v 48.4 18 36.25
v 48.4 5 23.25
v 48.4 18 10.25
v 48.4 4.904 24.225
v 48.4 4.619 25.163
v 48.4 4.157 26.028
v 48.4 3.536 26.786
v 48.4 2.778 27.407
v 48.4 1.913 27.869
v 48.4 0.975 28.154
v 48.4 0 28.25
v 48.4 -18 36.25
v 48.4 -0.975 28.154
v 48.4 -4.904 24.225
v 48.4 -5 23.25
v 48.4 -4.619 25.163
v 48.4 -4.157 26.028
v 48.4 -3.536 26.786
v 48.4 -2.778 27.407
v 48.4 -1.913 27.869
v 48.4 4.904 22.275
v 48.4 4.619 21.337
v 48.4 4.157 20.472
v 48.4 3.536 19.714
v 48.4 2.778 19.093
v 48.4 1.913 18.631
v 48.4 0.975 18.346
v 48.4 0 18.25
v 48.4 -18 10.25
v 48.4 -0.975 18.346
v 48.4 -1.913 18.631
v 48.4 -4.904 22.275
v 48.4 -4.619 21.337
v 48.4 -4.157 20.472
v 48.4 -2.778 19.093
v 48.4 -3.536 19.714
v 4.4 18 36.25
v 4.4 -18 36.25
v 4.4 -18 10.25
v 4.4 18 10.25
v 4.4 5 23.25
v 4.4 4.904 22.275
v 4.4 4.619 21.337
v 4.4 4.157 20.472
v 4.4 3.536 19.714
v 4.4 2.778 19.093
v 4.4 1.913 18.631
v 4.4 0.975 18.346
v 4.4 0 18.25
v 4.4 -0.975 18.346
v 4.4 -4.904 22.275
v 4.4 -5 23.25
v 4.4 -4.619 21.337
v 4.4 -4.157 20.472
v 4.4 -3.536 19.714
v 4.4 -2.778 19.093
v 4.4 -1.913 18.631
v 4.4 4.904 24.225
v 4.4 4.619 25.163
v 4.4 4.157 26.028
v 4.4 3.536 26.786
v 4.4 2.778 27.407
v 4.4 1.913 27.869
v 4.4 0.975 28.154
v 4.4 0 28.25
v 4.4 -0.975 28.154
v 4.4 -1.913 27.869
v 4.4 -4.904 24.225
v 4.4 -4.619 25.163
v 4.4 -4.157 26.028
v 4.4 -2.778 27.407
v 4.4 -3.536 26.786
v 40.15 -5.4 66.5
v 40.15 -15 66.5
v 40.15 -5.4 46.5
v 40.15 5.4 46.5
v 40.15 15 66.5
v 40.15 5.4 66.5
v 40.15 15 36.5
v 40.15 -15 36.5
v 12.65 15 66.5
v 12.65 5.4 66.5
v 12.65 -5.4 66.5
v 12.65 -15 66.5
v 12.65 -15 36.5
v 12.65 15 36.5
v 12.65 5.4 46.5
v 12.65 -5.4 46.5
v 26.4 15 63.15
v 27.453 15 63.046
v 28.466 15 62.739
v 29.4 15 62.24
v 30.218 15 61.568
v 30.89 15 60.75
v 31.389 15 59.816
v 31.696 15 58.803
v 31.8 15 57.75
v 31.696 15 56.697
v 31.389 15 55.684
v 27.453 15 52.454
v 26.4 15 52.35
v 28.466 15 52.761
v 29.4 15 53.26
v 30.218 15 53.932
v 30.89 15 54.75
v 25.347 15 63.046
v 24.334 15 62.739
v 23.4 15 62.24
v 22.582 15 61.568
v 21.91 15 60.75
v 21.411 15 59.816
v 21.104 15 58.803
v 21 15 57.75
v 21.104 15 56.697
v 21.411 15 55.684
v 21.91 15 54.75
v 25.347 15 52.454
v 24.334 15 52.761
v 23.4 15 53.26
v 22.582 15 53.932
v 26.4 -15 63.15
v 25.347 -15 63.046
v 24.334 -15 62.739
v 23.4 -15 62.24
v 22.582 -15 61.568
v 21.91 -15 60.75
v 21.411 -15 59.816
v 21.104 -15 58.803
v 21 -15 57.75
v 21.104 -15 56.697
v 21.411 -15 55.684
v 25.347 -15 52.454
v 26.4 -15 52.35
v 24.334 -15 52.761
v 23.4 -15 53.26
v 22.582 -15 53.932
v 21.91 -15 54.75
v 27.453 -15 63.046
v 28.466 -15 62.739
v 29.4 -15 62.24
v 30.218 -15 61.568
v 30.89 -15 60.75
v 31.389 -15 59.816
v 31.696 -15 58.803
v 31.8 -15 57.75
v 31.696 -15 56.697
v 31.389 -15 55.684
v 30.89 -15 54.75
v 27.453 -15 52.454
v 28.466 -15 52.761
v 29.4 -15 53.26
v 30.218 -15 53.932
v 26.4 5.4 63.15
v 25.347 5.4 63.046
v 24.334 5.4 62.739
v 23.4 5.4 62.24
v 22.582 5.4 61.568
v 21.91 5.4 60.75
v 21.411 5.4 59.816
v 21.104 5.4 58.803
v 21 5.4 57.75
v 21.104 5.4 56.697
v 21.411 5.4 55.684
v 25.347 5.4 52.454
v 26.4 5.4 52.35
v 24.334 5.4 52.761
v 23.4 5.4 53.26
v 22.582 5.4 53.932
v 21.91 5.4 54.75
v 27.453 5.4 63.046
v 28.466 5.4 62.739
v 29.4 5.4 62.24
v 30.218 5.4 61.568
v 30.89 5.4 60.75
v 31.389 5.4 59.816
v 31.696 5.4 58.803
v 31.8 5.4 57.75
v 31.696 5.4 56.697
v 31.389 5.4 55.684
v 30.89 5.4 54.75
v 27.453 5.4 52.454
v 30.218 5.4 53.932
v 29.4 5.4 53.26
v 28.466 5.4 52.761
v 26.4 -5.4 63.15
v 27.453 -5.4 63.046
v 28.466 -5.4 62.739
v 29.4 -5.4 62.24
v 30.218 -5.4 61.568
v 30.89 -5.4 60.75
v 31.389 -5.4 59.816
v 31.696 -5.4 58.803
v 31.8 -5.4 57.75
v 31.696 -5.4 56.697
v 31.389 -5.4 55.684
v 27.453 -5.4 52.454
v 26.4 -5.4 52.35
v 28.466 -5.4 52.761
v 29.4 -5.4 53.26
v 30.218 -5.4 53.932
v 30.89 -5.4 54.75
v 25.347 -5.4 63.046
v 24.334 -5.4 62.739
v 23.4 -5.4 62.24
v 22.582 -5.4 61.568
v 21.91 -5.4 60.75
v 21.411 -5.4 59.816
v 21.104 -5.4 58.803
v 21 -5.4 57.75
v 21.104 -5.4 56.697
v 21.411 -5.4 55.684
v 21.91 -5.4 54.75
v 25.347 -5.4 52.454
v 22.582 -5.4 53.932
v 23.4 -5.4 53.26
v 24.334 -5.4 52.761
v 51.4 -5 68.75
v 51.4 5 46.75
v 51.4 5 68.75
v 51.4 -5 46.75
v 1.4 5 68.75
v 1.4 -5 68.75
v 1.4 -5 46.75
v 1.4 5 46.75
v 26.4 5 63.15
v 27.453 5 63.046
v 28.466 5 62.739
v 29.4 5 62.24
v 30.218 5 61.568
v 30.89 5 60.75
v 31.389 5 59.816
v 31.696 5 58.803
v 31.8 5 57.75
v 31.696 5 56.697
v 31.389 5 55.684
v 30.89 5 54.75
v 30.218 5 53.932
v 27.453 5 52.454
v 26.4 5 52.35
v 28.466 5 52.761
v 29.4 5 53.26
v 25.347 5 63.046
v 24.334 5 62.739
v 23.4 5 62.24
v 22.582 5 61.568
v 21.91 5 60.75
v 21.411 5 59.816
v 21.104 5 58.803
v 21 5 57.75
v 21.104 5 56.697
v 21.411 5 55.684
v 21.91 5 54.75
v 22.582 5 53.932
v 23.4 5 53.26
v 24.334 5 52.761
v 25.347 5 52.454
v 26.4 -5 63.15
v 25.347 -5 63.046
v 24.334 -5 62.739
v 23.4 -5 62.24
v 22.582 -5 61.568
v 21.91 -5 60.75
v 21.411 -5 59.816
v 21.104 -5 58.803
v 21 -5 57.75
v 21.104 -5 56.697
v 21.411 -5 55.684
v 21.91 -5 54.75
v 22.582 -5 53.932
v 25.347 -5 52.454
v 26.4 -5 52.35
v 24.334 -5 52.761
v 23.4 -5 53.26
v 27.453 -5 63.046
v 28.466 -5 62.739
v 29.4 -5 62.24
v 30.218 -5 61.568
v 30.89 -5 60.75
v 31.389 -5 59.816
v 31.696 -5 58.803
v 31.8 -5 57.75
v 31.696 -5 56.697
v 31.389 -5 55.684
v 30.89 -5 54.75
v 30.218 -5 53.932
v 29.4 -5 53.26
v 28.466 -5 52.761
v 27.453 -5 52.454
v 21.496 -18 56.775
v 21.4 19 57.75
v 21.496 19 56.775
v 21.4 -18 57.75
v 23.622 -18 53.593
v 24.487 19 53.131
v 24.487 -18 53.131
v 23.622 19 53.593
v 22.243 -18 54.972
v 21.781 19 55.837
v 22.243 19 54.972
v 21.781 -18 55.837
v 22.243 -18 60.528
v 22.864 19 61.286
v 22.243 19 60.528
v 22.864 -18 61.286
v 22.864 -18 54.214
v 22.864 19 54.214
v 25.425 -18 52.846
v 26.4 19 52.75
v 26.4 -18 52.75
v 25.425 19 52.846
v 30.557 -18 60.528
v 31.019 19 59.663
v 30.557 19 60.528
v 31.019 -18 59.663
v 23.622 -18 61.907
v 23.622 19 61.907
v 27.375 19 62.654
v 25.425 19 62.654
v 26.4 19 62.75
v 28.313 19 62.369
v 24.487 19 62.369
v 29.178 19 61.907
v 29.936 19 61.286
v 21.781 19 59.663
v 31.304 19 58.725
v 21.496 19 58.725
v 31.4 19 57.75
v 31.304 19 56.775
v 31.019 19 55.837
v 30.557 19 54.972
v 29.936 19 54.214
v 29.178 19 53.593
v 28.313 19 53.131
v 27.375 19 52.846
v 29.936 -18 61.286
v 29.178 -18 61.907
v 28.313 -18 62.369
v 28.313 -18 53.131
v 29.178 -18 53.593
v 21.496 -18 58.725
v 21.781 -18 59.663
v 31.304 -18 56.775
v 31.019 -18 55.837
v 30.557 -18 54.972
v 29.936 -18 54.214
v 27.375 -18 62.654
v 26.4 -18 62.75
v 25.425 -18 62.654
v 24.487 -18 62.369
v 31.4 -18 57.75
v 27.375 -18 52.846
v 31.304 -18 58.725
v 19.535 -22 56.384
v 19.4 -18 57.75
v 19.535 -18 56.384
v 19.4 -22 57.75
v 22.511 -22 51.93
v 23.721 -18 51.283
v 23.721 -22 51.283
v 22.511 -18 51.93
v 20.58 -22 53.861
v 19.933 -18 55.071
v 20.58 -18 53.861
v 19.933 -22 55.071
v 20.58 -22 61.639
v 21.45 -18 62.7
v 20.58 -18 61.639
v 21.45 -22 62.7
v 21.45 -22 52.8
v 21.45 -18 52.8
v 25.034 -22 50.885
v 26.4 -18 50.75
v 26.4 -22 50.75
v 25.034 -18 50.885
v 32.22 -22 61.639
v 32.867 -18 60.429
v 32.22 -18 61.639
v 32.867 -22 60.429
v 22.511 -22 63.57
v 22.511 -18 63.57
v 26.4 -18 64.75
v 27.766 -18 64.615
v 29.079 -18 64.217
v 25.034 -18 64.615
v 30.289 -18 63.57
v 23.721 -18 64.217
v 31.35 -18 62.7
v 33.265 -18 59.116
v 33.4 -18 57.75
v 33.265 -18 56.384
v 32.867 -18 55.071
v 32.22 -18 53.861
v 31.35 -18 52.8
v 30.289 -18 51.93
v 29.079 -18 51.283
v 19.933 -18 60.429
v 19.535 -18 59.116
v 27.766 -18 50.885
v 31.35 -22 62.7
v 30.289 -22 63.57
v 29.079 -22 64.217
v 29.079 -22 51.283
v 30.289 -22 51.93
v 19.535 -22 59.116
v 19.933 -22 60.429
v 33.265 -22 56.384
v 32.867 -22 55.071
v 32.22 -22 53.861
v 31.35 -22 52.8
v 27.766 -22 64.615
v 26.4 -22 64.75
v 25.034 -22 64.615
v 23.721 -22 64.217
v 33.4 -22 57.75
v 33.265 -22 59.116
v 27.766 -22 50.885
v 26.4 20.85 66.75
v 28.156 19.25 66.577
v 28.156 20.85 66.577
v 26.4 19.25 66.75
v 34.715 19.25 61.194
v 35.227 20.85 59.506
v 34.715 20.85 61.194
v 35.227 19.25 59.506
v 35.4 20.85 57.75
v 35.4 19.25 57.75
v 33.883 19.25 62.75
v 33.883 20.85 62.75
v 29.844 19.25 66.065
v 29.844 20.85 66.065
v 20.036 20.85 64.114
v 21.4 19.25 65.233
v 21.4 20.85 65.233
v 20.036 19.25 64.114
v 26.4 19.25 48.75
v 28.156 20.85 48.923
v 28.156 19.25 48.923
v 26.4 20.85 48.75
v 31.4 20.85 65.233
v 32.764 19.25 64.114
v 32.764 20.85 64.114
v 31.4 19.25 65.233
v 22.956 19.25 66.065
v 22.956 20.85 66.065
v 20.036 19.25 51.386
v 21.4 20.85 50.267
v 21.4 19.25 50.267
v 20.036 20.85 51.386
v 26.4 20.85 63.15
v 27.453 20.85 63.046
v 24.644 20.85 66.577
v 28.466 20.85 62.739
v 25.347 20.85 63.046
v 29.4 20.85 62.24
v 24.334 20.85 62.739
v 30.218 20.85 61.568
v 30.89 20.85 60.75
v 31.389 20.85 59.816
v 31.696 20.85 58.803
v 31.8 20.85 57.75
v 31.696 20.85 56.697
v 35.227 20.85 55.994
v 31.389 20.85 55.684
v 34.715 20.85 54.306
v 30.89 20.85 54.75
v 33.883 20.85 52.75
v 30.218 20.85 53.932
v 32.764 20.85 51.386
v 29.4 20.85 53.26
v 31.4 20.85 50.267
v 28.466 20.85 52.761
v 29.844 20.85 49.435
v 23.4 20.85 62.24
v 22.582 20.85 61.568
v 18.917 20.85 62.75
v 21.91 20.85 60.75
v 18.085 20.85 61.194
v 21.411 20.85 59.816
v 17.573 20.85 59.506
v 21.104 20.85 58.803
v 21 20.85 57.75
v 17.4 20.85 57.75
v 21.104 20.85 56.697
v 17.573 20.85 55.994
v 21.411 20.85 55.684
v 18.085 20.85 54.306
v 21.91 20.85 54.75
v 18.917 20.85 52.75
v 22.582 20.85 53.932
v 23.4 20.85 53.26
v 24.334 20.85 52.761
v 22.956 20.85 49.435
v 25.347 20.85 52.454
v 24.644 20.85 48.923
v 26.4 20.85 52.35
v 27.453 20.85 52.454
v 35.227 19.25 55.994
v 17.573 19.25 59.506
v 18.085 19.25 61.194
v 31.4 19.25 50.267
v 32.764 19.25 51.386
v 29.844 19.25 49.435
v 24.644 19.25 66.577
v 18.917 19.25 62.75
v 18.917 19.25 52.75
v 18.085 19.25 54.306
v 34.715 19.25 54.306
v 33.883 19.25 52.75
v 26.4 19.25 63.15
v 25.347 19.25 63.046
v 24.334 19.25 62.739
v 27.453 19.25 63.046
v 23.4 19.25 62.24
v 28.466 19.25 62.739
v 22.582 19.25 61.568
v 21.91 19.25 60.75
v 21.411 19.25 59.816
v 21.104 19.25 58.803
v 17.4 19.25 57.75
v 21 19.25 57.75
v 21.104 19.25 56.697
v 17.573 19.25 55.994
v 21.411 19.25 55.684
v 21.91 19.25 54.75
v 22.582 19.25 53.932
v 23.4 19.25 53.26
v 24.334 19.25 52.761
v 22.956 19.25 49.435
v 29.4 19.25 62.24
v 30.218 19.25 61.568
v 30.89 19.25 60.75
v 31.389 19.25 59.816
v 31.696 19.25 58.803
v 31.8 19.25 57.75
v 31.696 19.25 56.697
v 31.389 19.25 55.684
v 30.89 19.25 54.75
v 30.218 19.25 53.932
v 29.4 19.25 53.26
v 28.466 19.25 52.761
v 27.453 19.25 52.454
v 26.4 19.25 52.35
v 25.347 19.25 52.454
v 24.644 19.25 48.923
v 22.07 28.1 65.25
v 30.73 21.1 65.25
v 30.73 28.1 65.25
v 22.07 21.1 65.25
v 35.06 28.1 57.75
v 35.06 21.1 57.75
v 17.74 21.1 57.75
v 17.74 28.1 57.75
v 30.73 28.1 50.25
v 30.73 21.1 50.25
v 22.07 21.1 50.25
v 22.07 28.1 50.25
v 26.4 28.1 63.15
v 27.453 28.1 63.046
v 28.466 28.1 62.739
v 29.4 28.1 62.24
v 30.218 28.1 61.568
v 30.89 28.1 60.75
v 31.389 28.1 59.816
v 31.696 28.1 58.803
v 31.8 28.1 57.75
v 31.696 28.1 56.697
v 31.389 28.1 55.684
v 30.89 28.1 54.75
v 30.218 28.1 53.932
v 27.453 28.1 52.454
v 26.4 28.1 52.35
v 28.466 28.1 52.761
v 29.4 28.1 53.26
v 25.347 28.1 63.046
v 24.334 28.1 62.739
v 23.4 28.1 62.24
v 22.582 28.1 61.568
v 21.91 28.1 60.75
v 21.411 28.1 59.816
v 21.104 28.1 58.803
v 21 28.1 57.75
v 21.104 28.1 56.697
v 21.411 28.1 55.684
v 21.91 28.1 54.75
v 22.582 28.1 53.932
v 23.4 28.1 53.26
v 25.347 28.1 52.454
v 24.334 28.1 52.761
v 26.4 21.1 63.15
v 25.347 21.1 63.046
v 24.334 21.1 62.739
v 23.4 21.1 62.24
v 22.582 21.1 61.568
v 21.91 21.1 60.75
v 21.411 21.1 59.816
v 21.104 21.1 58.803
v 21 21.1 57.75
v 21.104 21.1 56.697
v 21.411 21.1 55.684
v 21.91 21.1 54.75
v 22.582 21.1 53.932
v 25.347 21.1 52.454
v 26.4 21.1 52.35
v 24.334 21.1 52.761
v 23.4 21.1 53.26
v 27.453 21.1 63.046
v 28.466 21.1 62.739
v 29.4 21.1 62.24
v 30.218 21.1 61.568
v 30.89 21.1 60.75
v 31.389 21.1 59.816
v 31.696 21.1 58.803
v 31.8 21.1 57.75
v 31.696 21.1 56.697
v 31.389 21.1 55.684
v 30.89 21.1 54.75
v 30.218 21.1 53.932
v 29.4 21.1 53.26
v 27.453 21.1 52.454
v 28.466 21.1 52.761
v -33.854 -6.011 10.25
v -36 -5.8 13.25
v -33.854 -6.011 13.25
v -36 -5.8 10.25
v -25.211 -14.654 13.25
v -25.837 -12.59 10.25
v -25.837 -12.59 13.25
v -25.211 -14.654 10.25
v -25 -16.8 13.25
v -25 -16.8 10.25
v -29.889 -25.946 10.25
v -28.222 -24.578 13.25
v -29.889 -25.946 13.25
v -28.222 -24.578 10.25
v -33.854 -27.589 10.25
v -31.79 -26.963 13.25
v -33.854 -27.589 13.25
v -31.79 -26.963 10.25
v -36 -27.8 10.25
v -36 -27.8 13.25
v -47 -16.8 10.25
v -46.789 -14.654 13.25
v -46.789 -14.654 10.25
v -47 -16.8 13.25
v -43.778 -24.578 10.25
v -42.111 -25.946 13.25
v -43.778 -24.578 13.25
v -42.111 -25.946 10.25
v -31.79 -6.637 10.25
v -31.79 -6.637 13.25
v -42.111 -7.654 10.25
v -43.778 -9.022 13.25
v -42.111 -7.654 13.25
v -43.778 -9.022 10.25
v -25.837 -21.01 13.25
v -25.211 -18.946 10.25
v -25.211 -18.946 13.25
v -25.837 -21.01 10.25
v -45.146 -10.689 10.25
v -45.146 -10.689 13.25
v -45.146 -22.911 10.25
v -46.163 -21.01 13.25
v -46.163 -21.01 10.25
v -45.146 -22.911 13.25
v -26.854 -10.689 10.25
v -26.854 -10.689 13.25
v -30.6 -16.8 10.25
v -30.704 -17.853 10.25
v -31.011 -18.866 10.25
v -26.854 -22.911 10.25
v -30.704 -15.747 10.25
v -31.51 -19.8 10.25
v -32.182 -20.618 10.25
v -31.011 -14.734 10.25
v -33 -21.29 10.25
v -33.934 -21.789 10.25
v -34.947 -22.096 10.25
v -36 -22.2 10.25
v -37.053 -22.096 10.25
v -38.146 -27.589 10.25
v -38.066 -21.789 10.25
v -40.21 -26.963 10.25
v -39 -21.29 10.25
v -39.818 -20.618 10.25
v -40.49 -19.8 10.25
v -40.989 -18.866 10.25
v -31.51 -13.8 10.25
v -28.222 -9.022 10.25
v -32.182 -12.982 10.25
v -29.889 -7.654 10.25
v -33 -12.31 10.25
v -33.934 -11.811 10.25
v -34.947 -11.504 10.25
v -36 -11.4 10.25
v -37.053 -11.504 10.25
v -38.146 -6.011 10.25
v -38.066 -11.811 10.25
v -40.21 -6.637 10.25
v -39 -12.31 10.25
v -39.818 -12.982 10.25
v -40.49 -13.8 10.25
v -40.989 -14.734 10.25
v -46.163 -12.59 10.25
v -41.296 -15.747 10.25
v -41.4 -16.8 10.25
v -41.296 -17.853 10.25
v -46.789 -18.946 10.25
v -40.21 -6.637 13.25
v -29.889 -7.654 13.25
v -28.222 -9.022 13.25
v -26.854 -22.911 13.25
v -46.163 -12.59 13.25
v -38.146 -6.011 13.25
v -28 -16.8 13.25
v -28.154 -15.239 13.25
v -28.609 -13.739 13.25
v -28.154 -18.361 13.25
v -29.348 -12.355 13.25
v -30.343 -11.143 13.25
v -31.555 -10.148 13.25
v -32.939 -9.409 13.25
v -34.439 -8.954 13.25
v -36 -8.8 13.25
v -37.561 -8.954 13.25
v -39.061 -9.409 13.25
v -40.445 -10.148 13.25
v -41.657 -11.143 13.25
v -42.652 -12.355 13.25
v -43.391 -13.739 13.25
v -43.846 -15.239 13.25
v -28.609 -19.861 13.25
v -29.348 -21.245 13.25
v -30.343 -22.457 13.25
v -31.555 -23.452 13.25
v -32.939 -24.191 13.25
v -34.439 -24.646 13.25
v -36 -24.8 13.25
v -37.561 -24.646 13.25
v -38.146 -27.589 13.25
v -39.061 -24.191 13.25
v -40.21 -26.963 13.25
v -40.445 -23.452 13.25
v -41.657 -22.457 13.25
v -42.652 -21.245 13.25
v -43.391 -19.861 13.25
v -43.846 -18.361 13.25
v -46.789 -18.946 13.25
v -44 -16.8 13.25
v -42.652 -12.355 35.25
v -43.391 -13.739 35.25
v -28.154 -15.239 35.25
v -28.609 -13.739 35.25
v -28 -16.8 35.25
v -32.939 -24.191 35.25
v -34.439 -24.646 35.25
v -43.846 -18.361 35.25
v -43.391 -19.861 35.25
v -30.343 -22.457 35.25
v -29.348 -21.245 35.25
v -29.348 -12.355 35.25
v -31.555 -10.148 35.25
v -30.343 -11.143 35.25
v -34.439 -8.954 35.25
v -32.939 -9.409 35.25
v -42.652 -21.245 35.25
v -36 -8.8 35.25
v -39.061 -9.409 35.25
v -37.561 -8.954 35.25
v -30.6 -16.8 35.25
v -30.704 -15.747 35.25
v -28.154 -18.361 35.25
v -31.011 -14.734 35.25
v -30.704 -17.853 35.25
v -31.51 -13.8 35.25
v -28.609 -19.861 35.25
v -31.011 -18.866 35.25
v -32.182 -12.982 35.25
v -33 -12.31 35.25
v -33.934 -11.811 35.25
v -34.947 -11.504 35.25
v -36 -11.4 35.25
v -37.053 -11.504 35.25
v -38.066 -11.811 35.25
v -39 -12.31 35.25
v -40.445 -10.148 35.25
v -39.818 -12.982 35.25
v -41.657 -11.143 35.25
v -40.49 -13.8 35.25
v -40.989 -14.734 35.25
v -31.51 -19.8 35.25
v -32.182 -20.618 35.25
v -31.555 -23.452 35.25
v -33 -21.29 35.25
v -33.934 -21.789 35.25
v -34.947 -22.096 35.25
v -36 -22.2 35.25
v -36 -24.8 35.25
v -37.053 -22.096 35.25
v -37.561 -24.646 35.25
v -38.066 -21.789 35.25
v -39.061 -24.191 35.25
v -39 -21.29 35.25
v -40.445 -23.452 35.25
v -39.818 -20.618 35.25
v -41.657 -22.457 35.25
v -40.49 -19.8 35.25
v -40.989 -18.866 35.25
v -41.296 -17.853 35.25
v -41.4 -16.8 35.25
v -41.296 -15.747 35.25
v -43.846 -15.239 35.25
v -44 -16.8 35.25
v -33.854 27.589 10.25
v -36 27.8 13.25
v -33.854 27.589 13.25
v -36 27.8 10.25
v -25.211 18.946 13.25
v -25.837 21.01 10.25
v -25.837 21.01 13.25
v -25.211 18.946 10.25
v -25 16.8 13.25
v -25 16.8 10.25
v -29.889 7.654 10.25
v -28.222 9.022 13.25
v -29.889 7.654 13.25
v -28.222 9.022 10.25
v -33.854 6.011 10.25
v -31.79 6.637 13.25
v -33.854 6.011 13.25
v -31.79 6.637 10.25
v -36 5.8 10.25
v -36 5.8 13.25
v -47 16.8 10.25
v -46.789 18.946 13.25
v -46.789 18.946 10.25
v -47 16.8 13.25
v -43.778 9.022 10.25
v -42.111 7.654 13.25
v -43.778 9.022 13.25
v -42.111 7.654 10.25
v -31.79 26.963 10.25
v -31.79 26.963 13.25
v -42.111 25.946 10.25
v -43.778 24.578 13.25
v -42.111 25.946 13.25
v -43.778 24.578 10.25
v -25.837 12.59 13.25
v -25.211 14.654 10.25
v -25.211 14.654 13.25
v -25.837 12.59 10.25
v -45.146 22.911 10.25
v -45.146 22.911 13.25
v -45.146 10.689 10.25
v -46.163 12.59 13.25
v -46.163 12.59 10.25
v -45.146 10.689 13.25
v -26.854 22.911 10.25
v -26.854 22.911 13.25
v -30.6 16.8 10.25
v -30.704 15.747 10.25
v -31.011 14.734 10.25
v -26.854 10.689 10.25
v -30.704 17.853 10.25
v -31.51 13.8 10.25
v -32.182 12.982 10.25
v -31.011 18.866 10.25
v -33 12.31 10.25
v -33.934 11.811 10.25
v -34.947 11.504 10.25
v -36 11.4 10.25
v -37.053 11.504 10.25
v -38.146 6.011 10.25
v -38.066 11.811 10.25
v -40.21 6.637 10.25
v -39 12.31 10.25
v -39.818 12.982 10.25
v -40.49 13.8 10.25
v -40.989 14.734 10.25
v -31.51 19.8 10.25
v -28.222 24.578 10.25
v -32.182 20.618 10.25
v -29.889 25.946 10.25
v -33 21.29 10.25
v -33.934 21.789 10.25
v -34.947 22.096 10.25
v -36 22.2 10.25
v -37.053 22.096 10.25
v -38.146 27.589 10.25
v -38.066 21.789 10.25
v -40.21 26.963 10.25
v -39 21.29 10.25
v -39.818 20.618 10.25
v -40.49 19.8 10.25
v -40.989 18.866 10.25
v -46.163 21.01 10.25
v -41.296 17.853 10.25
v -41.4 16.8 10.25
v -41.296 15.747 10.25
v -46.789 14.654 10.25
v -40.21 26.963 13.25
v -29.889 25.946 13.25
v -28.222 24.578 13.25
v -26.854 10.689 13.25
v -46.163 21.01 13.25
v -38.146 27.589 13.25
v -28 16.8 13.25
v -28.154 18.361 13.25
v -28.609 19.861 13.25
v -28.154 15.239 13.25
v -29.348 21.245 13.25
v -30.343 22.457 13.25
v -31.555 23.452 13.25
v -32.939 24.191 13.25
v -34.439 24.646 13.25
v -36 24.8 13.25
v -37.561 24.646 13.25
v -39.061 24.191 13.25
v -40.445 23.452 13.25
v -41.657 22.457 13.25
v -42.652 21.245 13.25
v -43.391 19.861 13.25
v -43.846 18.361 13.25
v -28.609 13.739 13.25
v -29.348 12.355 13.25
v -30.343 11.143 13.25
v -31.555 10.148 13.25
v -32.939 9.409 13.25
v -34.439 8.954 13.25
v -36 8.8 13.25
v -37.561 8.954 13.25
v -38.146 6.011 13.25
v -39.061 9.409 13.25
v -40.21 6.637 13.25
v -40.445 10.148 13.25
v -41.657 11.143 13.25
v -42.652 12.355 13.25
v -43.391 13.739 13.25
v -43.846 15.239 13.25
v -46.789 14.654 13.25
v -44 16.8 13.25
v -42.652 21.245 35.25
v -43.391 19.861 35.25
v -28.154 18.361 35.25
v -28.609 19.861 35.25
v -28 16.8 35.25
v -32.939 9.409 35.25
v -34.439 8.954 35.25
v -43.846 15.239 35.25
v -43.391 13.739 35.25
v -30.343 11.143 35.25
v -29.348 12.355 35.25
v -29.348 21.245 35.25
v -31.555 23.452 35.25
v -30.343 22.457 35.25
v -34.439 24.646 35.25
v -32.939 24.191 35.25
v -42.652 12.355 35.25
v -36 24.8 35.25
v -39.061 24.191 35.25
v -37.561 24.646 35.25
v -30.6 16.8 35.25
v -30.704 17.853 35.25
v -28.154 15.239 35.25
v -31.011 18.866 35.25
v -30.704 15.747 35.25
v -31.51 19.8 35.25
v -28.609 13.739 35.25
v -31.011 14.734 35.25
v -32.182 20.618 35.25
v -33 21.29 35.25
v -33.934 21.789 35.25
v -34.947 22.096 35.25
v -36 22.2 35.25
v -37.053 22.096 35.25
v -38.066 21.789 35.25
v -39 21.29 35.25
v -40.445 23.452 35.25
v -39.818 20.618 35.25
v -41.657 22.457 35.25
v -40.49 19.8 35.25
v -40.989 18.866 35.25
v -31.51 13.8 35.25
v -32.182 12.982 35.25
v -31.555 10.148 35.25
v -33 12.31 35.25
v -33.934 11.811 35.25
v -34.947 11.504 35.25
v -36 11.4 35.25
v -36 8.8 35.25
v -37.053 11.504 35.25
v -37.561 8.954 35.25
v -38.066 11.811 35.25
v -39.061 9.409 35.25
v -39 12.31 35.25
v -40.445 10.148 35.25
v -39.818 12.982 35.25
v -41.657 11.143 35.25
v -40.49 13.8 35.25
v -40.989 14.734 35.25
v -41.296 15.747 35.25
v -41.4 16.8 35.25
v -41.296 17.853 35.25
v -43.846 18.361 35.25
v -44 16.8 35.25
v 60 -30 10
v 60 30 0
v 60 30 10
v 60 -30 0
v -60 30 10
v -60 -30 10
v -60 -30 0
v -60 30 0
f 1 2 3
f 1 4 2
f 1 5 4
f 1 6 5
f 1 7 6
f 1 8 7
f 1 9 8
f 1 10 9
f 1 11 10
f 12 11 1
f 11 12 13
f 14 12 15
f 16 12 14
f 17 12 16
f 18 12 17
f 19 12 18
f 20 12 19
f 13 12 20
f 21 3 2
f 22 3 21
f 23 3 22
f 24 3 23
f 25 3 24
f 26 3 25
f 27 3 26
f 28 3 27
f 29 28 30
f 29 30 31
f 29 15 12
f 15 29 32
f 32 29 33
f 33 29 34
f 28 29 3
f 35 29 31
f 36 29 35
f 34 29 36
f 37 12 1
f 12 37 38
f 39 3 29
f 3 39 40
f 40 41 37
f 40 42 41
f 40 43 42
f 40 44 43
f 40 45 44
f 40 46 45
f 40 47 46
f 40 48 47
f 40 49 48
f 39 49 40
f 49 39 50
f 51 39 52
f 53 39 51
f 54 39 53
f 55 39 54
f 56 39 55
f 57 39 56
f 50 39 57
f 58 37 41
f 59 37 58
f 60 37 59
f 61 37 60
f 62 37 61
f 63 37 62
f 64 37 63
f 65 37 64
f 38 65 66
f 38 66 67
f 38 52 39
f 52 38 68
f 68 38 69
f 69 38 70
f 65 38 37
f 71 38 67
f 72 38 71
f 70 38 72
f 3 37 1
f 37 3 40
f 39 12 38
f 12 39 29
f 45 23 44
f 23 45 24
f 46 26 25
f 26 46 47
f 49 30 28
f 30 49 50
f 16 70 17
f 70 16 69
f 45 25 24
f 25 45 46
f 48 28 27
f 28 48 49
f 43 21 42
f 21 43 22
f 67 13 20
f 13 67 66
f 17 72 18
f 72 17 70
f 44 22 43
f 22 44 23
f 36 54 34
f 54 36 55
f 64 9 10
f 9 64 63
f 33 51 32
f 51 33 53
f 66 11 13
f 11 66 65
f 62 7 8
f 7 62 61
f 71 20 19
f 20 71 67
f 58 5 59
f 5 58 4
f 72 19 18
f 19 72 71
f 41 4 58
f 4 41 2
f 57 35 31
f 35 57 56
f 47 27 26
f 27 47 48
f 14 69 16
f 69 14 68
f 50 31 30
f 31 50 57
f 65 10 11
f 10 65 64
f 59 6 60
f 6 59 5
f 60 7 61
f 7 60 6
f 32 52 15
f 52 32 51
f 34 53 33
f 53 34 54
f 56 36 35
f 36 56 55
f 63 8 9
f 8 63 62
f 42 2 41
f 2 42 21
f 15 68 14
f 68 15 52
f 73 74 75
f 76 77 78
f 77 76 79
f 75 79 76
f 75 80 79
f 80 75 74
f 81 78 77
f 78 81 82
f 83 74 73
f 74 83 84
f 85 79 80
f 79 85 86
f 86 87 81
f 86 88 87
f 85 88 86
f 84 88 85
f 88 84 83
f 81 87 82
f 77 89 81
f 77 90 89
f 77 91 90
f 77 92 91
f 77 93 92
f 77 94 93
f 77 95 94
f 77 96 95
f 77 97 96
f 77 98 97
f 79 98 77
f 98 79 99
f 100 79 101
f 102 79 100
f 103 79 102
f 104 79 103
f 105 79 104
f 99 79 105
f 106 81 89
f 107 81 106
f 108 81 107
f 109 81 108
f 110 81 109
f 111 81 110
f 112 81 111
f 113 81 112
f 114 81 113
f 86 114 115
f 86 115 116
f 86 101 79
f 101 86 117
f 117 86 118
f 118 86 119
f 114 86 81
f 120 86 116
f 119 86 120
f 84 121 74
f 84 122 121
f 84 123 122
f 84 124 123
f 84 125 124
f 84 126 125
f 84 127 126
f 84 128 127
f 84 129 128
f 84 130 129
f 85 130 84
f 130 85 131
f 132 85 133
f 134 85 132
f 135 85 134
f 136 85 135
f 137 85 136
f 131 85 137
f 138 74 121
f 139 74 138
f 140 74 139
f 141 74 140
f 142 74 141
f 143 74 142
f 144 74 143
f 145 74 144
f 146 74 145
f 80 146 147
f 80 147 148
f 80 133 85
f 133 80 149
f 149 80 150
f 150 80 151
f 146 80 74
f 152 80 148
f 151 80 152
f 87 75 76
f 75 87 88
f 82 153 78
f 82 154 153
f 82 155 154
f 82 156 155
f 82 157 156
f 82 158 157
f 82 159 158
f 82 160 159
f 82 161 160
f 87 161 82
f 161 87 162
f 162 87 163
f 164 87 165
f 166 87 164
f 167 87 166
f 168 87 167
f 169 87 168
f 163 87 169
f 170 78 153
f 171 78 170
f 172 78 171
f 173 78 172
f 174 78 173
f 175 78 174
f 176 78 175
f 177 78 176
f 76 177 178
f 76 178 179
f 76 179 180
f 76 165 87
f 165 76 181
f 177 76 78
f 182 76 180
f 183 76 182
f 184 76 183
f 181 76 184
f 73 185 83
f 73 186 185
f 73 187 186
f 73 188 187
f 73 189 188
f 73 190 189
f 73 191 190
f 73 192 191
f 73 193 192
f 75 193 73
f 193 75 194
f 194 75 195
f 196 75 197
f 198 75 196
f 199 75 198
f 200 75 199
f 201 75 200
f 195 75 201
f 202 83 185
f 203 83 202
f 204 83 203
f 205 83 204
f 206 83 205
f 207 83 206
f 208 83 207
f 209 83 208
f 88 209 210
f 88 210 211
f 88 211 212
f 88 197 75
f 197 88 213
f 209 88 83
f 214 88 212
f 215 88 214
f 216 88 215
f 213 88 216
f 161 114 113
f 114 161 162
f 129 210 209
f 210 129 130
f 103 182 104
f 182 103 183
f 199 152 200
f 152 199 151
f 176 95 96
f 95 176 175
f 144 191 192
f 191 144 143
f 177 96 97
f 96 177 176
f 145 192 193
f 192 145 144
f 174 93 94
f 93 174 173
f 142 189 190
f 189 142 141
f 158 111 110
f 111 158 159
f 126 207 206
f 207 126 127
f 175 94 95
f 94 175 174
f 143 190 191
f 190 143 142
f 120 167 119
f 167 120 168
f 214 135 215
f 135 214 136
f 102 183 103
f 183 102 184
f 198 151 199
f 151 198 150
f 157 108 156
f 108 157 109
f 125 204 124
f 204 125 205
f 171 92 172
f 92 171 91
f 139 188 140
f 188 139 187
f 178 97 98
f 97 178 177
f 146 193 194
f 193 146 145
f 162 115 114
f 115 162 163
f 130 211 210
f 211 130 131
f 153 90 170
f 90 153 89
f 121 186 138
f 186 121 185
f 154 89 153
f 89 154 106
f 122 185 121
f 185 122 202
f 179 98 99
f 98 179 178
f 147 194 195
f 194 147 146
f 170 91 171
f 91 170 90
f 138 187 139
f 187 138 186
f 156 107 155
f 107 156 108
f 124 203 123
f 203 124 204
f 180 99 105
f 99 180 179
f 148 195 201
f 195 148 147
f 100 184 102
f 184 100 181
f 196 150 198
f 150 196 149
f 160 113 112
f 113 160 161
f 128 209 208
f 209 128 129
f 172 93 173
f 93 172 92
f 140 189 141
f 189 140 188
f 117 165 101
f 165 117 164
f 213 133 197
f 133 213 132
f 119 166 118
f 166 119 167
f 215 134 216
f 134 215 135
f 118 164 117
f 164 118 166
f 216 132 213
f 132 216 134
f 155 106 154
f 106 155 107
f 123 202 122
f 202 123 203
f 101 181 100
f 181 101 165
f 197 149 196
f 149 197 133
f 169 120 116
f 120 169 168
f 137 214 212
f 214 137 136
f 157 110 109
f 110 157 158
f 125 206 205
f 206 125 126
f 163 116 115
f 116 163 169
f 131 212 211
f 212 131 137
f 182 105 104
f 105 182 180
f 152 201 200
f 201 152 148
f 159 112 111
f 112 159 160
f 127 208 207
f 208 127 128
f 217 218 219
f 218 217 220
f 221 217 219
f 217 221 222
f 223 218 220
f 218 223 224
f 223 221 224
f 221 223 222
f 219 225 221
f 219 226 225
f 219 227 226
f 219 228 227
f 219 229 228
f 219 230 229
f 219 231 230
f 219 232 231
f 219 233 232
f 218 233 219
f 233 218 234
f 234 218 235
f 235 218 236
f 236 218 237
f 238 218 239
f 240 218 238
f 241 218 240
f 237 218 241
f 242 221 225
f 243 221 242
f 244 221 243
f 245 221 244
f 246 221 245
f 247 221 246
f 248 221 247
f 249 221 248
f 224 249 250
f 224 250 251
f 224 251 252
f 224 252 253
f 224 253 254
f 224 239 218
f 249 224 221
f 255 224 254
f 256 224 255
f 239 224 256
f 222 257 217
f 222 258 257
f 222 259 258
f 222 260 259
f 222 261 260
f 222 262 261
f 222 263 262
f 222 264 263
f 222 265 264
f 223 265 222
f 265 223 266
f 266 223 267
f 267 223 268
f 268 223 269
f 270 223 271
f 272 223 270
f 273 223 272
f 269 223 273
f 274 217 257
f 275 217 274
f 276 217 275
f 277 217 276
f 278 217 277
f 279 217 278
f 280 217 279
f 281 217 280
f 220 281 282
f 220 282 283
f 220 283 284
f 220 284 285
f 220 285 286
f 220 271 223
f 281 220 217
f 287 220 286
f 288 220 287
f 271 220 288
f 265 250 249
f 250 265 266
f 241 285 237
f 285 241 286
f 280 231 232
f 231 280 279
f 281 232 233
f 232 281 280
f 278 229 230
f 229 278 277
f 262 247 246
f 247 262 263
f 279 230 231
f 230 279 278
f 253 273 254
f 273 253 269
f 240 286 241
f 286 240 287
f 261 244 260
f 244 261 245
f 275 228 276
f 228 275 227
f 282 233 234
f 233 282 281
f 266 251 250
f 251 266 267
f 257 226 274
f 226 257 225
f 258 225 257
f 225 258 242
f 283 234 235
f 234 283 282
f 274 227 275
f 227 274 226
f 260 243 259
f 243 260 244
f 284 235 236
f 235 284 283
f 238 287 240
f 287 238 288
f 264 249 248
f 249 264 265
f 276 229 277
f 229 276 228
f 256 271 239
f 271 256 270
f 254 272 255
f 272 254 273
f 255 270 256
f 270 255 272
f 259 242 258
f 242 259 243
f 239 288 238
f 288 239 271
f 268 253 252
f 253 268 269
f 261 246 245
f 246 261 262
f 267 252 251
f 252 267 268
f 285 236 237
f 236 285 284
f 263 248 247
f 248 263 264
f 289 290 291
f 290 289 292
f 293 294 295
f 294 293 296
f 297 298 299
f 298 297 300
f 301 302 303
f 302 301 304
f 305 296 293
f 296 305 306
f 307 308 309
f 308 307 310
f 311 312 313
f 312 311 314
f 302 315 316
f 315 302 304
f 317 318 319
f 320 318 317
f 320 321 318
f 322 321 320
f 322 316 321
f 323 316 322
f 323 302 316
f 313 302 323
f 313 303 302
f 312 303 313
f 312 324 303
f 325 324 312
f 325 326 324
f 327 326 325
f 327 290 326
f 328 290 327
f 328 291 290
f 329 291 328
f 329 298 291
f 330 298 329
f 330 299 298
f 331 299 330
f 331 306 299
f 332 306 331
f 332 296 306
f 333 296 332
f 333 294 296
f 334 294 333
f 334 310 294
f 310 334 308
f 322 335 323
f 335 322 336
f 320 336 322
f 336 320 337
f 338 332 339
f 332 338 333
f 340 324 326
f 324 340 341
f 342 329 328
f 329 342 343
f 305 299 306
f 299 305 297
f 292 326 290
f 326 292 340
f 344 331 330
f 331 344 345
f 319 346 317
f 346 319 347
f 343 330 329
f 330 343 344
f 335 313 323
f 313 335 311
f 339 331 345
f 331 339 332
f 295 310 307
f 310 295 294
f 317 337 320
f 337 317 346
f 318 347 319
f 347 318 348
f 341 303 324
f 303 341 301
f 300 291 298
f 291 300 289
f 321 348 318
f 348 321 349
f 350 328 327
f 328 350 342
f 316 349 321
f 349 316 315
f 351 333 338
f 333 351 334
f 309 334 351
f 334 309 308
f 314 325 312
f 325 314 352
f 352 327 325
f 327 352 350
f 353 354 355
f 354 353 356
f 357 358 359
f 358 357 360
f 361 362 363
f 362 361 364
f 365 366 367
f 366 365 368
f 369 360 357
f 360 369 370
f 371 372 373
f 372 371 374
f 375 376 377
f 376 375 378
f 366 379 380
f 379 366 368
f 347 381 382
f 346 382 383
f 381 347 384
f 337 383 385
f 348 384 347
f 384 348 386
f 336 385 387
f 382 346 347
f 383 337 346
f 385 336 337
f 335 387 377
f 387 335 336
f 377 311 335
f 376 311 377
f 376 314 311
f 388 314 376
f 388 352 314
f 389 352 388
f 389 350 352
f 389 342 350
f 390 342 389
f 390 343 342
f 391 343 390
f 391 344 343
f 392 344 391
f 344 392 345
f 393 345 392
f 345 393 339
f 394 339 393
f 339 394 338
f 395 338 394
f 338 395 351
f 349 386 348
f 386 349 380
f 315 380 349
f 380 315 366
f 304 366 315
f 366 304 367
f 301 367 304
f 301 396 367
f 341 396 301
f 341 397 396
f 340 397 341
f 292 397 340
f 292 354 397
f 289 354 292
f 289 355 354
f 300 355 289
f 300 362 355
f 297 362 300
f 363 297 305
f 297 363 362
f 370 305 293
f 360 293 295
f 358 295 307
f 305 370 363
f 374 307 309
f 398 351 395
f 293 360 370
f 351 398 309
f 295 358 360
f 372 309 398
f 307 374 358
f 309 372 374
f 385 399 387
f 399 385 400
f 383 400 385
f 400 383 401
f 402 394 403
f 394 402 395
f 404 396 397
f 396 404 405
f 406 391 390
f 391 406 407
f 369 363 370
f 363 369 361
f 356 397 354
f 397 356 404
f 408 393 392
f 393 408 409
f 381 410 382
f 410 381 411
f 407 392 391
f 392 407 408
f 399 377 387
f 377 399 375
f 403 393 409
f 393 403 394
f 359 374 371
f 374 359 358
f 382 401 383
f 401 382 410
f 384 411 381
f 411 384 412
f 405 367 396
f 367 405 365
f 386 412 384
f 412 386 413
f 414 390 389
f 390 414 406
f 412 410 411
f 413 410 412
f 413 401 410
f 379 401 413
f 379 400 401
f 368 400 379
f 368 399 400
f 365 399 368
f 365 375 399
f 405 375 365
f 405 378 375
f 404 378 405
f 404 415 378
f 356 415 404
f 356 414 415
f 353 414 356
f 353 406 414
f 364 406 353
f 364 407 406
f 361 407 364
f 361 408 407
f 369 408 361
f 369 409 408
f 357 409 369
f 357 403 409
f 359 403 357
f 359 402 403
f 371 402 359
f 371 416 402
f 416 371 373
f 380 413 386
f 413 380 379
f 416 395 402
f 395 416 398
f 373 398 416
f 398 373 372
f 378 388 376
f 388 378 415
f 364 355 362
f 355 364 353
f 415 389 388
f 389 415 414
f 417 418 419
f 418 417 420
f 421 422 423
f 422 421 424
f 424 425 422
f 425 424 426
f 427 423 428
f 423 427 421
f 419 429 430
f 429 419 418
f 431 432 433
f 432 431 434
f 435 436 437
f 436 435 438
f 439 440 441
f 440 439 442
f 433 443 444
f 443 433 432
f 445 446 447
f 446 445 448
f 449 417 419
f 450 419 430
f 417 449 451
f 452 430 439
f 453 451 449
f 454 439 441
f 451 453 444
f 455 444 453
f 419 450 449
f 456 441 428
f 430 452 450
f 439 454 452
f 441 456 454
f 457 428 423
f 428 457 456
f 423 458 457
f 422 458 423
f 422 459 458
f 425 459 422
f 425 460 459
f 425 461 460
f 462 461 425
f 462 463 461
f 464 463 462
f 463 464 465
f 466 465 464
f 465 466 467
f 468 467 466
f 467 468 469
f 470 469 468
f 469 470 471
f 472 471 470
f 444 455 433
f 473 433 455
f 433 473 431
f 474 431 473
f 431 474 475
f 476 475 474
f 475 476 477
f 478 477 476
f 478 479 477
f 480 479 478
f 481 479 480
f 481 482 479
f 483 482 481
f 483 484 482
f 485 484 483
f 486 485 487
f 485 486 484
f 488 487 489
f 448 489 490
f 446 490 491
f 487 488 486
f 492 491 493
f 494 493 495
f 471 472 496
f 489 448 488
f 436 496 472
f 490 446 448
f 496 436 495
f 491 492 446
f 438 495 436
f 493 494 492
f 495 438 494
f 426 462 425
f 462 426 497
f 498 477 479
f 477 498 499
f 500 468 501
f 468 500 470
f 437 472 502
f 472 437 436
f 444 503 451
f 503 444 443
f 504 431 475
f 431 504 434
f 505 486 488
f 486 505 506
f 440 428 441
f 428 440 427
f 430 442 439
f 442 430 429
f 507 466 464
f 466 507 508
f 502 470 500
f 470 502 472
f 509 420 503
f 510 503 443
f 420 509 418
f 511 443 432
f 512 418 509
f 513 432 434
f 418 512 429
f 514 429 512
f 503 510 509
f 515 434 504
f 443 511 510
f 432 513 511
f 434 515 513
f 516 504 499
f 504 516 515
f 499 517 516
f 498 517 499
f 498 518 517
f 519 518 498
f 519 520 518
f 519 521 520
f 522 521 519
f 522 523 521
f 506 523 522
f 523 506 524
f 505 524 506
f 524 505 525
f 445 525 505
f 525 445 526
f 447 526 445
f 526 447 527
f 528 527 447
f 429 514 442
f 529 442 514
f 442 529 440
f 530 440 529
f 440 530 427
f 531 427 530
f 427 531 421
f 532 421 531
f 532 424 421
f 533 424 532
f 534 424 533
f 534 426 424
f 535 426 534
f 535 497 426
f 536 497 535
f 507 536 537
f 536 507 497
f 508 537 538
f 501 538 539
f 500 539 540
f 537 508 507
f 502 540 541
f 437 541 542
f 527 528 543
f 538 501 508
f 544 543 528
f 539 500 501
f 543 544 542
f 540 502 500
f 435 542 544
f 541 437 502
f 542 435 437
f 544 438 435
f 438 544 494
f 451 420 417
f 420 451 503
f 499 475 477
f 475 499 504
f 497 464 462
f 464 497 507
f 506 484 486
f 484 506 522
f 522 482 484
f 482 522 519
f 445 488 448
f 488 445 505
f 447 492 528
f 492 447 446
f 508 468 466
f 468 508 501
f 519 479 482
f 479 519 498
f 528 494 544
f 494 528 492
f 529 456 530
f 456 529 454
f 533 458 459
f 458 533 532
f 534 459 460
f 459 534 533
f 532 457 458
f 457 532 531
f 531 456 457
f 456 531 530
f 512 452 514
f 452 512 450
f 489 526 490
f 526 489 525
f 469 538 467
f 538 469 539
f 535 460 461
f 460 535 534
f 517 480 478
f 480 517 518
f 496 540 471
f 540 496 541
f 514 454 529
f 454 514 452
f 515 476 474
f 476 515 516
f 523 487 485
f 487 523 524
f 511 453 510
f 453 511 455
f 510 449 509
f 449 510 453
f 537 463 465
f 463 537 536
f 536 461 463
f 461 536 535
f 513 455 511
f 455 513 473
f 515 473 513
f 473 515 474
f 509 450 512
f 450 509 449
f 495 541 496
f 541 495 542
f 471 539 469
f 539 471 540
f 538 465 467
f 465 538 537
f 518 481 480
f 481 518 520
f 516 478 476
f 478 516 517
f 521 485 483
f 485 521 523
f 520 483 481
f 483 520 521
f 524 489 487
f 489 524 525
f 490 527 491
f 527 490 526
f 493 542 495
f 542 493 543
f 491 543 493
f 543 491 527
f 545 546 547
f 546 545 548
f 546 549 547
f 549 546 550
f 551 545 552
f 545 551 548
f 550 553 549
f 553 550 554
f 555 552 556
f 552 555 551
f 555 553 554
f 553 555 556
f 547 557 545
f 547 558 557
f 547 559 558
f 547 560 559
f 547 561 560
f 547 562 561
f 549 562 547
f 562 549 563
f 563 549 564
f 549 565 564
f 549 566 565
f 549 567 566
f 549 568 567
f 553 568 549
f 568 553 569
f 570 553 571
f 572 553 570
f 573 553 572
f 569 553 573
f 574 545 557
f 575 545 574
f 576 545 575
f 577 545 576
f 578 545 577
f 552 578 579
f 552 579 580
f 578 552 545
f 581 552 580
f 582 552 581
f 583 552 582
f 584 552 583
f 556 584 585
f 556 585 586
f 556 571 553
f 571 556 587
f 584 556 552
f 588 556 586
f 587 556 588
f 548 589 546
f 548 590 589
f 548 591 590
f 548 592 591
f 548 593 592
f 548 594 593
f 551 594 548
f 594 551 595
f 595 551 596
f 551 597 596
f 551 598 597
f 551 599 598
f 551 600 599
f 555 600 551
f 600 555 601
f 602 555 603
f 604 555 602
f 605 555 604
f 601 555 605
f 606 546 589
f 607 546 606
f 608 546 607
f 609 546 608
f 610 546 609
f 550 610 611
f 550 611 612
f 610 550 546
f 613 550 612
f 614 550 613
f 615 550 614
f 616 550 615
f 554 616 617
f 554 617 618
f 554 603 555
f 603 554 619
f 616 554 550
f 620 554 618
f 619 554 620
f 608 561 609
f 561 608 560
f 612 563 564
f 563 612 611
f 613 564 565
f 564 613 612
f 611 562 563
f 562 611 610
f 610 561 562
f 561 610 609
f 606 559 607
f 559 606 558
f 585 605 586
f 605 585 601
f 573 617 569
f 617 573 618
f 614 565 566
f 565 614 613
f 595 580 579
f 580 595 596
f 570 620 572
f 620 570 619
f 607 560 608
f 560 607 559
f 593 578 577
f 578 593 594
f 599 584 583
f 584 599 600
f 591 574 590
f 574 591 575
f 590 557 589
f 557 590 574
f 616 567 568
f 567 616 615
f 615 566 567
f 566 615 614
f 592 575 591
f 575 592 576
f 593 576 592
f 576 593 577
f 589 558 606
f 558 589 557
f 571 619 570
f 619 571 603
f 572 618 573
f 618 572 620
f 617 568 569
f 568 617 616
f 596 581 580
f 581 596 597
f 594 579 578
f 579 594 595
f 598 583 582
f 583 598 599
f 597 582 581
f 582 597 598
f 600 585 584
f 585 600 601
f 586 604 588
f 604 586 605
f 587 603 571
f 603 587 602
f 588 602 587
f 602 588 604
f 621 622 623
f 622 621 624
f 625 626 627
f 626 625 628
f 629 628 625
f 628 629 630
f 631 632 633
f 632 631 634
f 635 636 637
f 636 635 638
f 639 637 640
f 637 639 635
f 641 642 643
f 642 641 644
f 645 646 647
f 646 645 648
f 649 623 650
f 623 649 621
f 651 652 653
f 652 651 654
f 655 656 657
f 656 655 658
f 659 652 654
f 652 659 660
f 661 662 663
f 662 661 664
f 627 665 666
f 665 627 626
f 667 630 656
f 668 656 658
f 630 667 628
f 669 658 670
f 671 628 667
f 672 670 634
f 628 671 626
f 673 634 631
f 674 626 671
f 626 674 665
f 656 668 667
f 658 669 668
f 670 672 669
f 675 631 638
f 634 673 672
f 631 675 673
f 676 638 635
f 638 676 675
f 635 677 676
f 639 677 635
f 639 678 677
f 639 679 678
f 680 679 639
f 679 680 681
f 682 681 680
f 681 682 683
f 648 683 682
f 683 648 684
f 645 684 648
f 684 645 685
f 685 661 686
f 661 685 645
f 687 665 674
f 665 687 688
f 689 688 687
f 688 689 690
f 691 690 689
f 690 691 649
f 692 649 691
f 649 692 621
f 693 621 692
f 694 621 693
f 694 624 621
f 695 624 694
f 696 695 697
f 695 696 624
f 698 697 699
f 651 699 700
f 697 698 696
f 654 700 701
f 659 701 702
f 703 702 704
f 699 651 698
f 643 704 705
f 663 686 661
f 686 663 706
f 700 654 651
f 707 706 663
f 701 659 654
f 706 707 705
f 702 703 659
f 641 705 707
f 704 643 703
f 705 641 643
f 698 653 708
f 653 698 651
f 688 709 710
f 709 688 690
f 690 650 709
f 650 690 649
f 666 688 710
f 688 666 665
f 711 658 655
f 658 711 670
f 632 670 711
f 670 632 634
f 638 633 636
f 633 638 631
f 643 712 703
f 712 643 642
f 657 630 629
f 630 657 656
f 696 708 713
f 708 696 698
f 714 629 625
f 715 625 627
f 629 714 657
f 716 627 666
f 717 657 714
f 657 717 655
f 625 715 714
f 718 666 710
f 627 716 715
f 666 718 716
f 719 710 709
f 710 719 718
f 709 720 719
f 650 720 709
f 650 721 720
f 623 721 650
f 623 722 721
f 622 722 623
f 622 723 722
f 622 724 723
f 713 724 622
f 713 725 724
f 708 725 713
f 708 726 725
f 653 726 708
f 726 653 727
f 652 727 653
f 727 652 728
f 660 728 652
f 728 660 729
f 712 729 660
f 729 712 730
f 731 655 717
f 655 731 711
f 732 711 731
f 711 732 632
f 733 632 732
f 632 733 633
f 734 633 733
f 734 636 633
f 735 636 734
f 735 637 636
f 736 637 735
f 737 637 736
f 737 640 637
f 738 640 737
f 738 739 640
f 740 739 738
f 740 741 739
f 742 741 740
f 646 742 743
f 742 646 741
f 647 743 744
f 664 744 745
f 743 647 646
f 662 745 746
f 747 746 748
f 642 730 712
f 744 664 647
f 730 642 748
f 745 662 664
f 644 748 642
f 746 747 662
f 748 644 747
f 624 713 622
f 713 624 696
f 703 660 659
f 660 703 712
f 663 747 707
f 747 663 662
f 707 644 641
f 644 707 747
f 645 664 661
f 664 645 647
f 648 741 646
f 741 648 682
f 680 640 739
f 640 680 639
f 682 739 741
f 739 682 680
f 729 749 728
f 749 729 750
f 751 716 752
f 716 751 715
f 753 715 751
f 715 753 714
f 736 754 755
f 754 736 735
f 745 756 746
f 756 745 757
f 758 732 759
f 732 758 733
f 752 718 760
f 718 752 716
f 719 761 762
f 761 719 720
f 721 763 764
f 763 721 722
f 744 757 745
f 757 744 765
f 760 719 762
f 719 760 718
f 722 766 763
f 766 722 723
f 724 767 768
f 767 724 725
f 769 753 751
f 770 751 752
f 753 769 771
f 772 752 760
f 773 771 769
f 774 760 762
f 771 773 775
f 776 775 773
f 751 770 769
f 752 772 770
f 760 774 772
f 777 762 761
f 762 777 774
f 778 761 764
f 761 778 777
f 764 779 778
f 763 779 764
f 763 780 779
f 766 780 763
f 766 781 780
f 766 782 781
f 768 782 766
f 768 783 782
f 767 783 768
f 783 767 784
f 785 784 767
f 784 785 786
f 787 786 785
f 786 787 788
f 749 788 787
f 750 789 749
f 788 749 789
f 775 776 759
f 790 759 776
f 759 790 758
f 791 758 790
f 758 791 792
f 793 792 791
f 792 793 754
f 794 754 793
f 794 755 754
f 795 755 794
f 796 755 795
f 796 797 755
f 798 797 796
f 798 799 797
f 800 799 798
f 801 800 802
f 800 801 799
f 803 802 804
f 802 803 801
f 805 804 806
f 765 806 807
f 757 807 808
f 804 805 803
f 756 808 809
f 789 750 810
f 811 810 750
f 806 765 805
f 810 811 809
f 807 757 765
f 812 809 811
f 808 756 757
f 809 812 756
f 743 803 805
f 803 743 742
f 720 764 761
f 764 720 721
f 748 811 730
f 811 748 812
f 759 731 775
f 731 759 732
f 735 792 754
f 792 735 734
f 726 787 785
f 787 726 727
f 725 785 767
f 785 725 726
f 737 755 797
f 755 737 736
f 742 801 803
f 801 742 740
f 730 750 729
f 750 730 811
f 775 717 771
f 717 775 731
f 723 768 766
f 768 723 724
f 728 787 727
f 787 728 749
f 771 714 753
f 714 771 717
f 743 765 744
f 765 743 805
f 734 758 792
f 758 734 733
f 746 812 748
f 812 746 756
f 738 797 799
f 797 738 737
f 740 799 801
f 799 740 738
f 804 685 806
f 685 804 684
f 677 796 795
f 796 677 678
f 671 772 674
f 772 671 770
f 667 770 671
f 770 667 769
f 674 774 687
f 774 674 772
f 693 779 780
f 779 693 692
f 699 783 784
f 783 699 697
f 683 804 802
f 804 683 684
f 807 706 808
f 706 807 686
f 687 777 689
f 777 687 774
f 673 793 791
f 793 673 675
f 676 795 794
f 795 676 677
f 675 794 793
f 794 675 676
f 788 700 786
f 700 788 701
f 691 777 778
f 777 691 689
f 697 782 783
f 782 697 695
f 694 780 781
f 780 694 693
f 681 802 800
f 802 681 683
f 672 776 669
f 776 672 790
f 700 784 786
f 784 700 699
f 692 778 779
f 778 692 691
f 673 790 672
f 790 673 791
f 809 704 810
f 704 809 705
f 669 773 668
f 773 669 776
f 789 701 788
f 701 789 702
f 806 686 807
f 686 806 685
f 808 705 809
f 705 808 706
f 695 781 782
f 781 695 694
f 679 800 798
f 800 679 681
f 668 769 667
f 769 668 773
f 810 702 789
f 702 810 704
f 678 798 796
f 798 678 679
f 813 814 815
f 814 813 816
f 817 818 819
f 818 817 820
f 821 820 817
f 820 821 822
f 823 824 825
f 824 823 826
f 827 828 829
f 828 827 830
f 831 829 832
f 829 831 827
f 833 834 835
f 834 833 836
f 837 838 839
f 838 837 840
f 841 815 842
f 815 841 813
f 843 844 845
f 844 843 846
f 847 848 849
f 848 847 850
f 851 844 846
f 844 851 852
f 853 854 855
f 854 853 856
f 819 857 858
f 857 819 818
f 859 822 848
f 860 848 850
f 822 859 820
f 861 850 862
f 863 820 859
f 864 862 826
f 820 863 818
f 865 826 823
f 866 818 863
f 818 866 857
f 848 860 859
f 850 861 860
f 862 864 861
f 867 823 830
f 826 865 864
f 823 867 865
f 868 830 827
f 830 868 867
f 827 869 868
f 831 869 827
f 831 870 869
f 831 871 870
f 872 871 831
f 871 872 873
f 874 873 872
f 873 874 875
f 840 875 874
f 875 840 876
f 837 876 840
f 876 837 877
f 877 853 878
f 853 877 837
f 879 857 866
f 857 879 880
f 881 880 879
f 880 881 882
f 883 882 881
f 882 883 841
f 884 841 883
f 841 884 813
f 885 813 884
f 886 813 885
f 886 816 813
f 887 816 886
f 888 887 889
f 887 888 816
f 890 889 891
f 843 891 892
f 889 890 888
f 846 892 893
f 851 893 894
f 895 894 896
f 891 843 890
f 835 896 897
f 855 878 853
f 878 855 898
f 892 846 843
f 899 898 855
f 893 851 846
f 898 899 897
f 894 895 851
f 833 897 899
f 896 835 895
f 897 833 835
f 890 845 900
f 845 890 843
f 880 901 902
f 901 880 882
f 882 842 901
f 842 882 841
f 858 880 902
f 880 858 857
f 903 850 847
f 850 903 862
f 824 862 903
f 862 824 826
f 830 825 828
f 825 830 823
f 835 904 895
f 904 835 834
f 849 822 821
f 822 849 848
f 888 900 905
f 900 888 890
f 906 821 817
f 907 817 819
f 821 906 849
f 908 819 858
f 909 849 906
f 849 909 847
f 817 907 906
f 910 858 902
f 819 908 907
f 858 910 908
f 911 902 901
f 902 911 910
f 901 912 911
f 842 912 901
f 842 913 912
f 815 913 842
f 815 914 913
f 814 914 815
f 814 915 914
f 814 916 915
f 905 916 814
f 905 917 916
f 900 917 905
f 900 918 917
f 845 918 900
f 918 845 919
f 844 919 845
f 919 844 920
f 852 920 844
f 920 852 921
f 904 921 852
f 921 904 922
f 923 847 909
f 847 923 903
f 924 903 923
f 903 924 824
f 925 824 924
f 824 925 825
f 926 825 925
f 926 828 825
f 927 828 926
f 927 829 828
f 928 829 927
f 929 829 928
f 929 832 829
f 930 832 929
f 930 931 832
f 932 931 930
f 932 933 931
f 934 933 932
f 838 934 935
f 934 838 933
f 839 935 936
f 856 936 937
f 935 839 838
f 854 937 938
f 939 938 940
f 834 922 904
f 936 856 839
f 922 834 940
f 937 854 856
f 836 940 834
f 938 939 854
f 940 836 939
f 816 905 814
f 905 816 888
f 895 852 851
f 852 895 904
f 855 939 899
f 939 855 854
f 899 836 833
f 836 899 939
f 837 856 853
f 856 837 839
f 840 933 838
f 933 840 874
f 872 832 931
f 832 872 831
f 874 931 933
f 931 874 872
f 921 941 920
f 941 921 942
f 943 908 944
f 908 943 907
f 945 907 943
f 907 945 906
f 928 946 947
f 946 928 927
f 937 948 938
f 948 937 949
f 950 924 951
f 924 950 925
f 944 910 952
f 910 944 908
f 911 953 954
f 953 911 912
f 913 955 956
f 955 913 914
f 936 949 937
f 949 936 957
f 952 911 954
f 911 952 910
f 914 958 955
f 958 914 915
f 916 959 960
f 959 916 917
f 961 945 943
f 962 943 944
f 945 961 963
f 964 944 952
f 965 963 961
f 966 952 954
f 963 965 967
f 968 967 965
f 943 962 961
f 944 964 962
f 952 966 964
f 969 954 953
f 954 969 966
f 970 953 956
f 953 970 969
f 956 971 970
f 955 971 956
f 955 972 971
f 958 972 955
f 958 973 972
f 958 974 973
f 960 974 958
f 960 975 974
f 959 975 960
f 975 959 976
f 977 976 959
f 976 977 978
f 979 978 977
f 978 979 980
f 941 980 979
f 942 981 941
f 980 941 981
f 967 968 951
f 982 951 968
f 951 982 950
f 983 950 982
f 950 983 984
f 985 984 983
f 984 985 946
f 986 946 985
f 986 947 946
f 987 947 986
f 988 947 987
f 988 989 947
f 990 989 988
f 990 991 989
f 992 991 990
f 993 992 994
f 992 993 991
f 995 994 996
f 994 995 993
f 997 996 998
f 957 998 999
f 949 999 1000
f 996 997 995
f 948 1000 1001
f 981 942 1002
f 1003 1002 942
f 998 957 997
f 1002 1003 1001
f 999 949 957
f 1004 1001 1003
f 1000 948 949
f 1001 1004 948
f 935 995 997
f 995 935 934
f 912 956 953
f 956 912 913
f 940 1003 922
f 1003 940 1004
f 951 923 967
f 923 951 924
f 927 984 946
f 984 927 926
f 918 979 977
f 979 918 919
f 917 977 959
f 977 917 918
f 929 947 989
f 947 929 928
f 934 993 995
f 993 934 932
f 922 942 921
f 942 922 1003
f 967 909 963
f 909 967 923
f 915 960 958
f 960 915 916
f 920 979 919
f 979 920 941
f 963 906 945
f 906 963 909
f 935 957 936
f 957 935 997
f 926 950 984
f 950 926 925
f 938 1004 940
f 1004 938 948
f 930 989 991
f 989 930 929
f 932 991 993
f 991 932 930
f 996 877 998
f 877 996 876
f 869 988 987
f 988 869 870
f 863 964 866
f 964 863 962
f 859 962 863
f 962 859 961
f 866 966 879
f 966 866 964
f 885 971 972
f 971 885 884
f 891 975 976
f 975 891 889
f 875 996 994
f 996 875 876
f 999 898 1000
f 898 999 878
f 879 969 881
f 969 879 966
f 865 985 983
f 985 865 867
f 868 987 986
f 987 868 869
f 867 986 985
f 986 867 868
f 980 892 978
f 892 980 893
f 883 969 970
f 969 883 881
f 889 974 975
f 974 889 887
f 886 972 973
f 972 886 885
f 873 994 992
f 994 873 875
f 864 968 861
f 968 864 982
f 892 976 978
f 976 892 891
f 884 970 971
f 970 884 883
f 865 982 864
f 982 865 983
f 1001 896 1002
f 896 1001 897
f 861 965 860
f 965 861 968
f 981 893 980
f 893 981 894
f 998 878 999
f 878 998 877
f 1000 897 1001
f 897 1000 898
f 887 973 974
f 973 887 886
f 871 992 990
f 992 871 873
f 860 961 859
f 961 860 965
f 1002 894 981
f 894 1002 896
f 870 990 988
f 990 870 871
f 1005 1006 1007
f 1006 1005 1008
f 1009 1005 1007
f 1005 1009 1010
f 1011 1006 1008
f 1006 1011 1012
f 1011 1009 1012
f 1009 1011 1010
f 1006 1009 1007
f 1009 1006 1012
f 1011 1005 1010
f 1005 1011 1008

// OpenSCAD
$fn = 32;

// ------------------------------------------------------------------------
// Indexing jig: plate 120 x 60 mm, pin d10
// Every part is its own module, assembly() places every instance.
// ------------------------------------------------------------------------

// --- part 1 ---
module jig_plate() {
  difference() {
    translate([-60, -30, 0]) cube([120, 60, 10]);
  }
}

// --- part 2 ---
module locator_block() {
  difference() {
    translate([-22, -18, 0]) cube([44, 36, 26]);
    translate([0, 0, 13]) rotate([0, 90, 0]) cylinder(h = 46, d = 10, center = true);
  }
}

// --- part 3 ---
module index_fork() {
  difference() {
    translate([-13.75, -15, 0]) cube([27.5, 30, 30]);
    translate([-14.75, -5.4, 10]) cube([29.5, 10.8, 21]);
    translate([0, 0, 21.25]) rotate([90, 0, 0]) cylinder(h = 32, d = 10.8, center = true);
  }
}

// --- part 4 ---
module index_arm() {
  difference() {
    translate([-25, -5, 0]) cube([50, 10, 22]);
    translate([0, 0, 11]) rotate([90, 0, 0]) cylinder(h = 12, d = 10.8, center = true);
  }
}

// --- part 5 ---
module index_pin() {
  rotate([0, 90, 0]) cylinder(h = 38, d = 10, center = true);
  translate([-22, 0, 0]) rotate([0, 90, 0]) cylinder(h = 4, d = 14);
}

// --- part 6 ---
module pin_washer() {
  difference() {
      translate([0, 0, 0]) cylinder(h = 1.6, d = 18);
      translate([0, 0, -1]) cylinder(h = 3.6, d = 10.8);
    }
}

// --- part 7 ---
module lock_nut() {
  difference() {
    linear_extrude(height = 7) polygon(points = [[8.66, 0], [4.33, 7.5], [-4.33, 7.5], [-8.66, 0], [-4.33, -7.5], [4.33, -7.5]]);
    translate([0, 0, -1]) cylinder(h = 9, d = 10.8);
  }
}

// --- part 8 ---
module guide_bush_a() {
  difference() {
    union() {
      cylinder(h = 3, d = 22);
      translate([0, 0, 3]) cylinder(h = 22, d = 16);
    }
    translate([0, 0, -1]) cylinder(h = 27, d = 10.8);
  }
}

// --- part 9 ---
module guide_bush_b() {
  difference() {
    union() {
      cylinder(h = 3, d = 22);
      translate([0, 0, 3]) cylinder(h = 22, d = 16);
    }
    translate([0, 0, -1]) cylinder(h = 27, d = 10.8);
  }
}

// --- assembly ---
module assembly() {
  color([0.80, 0.24, 0.20]) translate([0, 0, 0]) rotate([0, 0, 0]) jig_plate();
  color([0.20, 0.45, 0.75]) translate([26.4, 0, 10.25]) rotate([0, 0, 0]) locator_block();
  color([0.25, 0.62, 0.32]) translate([26.4, 0, 36.5]) rotate([0, 0, 0]) index_fork();
  color([0.92, 0.70, 0.18]) translate([26.4, 0, 46.75]) rotate([0, 0, 0]) index_arm();
  color([0.58, 0.35, 0.70]) translate([26.4, 0, 57.75]) rotate([0, 0, 90]) index_pin();
  color([0.16, 0.66, 0.66]) translate([26.4, 20.85, 57.75]) rotate([90, 0, 0]) pin_washer();
  color([0.85, 0.48, 0.18]) translate([26.4, 28.1, 57.75]) rotate([90, 0, 0]) lock_nut();
  color([0.55, 0.60, 0.65]) translate([-36, -16.8, 10.25]) rotate([0, 0, 0]) guide_bush_a();
  color([0.75, 0.30, 0.55]) translate([-36, 16.8, 10.25]) rotate([0, 0, 0]) guide_bush_b();
}

assembly();
